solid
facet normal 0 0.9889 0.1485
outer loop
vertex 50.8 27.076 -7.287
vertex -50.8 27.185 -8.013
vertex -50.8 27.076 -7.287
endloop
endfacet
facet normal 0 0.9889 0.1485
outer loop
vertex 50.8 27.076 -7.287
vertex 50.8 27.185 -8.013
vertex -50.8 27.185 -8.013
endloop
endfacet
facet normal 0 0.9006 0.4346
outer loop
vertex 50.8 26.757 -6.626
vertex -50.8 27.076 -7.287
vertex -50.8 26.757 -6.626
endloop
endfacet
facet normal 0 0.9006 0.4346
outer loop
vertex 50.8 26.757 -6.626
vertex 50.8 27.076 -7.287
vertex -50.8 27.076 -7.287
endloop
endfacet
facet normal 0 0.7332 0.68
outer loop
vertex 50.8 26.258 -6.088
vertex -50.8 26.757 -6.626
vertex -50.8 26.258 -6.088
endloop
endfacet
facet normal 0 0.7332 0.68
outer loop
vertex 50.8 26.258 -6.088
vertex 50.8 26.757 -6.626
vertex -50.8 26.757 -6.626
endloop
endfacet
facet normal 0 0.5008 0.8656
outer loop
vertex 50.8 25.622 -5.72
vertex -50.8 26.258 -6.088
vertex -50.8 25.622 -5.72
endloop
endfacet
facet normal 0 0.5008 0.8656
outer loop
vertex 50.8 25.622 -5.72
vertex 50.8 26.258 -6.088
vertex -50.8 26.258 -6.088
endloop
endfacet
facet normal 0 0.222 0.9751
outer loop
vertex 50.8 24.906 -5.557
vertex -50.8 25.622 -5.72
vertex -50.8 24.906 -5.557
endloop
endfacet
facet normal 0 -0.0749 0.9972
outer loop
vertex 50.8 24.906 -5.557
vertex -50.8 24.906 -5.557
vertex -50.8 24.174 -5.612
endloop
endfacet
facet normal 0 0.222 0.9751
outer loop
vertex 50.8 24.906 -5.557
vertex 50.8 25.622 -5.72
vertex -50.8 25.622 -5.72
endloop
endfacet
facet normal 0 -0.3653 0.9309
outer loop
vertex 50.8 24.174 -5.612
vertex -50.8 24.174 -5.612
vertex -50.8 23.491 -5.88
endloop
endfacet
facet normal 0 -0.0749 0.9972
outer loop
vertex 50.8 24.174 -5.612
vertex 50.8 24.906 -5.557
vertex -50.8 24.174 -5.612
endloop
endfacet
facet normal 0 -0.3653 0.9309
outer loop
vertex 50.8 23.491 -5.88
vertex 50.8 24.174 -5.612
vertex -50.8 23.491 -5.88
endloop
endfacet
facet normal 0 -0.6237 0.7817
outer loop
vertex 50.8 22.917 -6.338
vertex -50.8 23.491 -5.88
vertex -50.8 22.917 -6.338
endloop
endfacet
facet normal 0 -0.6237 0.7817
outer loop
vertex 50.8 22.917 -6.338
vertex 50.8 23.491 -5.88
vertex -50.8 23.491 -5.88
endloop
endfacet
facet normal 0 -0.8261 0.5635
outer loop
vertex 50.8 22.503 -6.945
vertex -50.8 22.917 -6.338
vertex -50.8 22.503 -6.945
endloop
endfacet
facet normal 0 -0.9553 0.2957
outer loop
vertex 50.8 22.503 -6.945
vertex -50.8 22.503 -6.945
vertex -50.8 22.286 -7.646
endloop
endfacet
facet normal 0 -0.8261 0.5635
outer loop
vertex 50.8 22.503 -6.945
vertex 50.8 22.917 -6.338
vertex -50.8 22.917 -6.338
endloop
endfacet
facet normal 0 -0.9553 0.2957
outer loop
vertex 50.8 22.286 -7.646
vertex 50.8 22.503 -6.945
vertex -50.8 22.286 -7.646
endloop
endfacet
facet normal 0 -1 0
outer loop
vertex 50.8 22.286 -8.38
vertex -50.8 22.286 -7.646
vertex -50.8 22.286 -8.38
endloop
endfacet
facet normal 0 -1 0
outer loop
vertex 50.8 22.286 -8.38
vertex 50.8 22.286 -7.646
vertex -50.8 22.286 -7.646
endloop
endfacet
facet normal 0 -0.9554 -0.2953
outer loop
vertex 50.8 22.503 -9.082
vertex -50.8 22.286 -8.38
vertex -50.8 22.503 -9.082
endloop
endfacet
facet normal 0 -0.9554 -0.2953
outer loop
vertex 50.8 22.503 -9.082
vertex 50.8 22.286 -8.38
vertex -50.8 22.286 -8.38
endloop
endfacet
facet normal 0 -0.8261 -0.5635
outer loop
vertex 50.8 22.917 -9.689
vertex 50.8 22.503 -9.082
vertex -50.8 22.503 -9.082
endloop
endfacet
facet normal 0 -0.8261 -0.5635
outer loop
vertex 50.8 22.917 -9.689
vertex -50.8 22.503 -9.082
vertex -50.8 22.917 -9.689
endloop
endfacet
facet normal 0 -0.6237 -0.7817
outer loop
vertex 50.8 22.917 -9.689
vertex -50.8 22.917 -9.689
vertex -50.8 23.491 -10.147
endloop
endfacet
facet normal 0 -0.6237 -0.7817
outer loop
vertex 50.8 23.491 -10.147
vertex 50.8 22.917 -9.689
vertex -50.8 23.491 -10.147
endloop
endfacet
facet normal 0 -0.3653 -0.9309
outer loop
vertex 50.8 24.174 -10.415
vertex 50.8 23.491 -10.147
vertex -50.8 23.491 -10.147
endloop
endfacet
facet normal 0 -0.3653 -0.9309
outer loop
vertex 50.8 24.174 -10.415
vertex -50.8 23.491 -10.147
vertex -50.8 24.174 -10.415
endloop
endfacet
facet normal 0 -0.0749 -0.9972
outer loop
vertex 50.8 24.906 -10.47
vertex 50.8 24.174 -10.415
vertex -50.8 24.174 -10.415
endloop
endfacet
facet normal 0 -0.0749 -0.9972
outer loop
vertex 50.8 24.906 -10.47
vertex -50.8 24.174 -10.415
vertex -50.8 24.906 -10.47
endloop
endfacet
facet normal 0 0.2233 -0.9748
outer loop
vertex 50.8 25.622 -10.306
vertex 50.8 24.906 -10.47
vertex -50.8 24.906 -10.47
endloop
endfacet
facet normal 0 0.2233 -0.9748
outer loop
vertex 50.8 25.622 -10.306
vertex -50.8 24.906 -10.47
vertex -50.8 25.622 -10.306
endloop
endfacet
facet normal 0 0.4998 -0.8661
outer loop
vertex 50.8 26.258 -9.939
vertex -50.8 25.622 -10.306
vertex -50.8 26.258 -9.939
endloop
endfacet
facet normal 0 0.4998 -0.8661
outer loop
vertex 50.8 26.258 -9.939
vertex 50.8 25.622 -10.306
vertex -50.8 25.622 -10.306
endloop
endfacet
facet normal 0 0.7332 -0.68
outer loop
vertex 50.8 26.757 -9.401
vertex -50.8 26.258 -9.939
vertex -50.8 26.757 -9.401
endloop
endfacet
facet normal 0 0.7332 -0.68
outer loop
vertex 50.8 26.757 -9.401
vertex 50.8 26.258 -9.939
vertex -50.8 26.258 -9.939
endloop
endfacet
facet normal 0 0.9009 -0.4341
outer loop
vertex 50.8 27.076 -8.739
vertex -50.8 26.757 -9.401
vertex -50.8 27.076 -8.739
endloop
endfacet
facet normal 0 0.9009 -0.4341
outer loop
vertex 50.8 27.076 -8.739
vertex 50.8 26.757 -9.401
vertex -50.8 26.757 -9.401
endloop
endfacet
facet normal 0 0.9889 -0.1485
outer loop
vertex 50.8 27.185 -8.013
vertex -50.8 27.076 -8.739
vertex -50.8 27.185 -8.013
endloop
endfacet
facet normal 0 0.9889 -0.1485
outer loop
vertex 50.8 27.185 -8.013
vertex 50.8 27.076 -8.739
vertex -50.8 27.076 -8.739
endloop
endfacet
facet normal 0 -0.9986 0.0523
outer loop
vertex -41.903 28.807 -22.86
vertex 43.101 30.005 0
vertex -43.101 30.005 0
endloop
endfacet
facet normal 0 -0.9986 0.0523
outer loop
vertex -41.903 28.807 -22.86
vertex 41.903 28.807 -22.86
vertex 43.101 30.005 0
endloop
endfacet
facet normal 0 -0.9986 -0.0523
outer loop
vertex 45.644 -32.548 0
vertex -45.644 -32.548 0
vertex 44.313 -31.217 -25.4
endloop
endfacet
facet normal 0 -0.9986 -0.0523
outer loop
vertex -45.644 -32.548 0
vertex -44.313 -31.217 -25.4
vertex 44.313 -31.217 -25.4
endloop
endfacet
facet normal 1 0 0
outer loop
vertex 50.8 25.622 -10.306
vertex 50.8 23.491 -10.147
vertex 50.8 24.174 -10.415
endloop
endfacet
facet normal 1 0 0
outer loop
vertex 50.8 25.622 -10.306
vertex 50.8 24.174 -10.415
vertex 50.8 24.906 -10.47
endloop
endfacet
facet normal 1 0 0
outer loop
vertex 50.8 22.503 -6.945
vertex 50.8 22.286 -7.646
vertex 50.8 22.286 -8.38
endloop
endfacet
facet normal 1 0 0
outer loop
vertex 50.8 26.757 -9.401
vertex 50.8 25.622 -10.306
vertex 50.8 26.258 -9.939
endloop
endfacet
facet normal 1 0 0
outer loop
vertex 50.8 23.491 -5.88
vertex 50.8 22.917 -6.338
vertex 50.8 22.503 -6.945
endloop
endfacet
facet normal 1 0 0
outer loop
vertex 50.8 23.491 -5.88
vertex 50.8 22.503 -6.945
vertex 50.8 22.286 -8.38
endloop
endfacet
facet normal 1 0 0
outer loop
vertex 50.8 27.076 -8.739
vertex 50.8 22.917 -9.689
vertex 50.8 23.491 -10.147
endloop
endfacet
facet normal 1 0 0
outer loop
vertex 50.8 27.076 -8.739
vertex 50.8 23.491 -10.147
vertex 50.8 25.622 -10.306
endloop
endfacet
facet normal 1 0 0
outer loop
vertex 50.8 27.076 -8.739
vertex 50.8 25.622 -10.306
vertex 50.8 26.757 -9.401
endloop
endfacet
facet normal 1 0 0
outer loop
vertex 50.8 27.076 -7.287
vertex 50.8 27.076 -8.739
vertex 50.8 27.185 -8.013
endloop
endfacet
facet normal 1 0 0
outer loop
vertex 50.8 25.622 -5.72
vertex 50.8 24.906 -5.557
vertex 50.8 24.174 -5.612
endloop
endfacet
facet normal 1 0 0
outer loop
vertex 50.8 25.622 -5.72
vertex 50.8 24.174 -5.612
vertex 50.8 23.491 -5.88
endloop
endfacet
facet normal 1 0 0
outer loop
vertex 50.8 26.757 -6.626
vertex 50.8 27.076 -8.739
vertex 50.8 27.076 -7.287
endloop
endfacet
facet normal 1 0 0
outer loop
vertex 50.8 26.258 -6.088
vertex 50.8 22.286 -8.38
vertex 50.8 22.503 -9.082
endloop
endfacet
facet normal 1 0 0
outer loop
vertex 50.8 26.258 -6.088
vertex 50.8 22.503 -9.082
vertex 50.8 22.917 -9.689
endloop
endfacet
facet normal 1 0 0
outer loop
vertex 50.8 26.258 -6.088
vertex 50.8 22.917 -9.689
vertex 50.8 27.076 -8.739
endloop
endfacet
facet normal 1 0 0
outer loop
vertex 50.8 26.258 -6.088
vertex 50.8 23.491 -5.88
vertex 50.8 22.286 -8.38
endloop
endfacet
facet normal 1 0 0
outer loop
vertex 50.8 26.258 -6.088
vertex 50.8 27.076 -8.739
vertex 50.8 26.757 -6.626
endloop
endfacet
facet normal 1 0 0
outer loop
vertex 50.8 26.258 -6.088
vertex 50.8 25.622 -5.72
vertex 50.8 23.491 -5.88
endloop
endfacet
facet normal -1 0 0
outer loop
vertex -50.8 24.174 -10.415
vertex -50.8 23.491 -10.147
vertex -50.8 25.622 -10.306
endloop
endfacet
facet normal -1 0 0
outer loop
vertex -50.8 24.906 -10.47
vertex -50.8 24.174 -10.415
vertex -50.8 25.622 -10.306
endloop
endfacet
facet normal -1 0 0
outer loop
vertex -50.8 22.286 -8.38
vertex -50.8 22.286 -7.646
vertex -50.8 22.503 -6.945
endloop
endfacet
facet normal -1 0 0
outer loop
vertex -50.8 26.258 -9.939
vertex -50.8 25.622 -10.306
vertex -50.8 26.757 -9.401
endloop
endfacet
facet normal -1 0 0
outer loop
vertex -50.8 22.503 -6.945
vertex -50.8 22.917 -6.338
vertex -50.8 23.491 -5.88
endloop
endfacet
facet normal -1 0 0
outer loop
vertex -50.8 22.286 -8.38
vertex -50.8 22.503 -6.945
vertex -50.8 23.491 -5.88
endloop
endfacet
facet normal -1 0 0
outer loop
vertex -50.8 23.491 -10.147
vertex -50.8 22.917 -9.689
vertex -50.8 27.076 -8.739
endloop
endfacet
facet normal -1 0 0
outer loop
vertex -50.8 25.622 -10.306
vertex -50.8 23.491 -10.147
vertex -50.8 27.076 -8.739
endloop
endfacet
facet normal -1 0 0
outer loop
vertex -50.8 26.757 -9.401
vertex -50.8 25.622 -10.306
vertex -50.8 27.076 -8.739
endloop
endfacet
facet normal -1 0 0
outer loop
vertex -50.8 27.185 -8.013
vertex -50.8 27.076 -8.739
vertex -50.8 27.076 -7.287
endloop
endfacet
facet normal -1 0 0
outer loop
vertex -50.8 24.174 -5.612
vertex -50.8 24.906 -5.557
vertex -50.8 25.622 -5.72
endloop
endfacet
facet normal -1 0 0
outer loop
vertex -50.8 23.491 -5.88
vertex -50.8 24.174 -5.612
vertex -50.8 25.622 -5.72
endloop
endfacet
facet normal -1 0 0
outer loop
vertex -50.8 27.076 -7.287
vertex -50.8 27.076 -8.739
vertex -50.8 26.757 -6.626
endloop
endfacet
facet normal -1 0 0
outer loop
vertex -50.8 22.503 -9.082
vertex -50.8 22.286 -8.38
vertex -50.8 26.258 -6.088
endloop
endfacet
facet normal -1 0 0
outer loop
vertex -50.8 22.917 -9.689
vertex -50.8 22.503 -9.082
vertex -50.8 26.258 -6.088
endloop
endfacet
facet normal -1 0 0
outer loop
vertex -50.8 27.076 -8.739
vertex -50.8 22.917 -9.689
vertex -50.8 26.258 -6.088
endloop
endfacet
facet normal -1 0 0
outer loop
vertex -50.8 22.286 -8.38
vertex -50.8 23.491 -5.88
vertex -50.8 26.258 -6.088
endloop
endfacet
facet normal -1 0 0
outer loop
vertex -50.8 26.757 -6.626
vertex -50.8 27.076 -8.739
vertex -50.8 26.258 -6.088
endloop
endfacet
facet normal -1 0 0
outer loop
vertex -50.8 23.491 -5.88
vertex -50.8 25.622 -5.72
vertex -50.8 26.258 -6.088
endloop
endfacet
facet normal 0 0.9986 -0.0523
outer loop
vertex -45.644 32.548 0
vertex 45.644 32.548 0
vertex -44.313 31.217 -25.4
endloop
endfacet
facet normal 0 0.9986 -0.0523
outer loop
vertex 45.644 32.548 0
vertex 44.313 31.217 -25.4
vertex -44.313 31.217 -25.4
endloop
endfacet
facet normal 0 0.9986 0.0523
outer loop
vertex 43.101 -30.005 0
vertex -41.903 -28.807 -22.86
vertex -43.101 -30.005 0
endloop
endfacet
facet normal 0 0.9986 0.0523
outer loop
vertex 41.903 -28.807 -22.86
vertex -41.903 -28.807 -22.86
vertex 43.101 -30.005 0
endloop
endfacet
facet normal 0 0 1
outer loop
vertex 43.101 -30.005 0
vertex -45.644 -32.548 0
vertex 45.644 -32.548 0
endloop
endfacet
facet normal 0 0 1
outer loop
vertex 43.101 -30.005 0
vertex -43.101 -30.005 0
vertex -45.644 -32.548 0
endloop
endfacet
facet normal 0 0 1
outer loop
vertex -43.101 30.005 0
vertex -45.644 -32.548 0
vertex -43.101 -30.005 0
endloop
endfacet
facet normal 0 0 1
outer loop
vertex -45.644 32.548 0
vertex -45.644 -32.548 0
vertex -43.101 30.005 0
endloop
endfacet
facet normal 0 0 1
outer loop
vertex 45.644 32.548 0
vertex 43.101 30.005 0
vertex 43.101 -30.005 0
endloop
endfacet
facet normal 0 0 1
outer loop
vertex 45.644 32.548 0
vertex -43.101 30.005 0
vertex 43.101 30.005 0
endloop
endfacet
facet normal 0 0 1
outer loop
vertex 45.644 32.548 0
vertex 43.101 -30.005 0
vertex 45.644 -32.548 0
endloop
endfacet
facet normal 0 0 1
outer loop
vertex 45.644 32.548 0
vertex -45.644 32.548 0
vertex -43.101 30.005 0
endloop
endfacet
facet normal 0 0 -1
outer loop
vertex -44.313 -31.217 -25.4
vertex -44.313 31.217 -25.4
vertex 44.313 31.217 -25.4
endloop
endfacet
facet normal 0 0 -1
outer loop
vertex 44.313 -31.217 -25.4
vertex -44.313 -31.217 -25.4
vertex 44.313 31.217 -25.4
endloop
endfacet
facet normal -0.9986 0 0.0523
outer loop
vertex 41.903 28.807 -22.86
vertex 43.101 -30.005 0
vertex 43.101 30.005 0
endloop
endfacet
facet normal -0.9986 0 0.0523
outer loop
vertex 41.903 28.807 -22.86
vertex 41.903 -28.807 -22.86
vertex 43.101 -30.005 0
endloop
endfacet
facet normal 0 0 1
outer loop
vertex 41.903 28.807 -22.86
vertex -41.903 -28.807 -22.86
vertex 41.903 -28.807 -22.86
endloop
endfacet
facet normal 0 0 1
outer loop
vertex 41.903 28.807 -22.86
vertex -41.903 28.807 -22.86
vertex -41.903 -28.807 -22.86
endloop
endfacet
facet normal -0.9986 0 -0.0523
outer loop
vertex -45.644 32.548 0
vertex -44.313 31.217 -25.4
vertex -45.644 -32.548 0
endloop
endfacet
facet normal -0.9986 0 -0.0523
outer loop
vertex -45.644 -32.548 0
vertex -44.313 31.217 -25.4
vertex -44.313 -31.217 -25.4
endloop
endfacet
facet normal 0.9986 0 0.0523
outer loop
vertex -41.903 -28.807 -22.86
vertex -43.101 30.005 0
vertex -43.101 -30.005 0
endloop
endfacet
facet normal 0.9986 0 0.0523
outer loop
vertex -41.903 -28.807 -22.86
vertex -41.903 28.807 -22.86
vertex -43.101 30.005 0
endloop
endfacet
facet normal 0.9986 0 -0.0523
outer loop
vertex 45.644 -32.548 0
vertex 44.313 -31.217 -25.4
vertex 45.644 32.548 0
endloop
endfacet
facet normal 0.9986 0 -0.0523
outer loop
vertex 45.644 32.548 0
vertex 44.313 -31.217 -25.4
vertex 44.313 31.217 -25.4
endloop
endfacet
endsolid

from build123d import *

# Parameters (mm, degrees)
F0_W     = 91.288074851
F0_H     = 65.0969222188
F1_DEPTH = 25.4
F1_TAPER = 3
F2_T     = -2.54
F3_R     = 2.4631952169
F4_DEPTH = 50.8


with BuildPart() as f1:
    # F0 (on Top) → F1 (new body)
    with BuildSketch(Plane.XY):
        Rectangle(F0_W, F0_H)
    extrude(amount=-F1_DEPTH, taper=F1_TAPER)

    # F2
    f2_openings = [f1.faces().sort_by_distance(p)[0] for p in [
        (0, 0, 0),
    ]]
    offset(amount=F2_T, openings=f2_openings)


with BuildPart() as f4:
    # F3 (on Right) → F4 (new body, symmetric)
    with BuildSketch(Plane.YZ):
        with Locations((24.7221812606, -8.0133397132)):
            Circle(F3_R)
    extrude(amount=F4_DEPTH, both=True)


solid = Compound([f1.part, f4.part])
